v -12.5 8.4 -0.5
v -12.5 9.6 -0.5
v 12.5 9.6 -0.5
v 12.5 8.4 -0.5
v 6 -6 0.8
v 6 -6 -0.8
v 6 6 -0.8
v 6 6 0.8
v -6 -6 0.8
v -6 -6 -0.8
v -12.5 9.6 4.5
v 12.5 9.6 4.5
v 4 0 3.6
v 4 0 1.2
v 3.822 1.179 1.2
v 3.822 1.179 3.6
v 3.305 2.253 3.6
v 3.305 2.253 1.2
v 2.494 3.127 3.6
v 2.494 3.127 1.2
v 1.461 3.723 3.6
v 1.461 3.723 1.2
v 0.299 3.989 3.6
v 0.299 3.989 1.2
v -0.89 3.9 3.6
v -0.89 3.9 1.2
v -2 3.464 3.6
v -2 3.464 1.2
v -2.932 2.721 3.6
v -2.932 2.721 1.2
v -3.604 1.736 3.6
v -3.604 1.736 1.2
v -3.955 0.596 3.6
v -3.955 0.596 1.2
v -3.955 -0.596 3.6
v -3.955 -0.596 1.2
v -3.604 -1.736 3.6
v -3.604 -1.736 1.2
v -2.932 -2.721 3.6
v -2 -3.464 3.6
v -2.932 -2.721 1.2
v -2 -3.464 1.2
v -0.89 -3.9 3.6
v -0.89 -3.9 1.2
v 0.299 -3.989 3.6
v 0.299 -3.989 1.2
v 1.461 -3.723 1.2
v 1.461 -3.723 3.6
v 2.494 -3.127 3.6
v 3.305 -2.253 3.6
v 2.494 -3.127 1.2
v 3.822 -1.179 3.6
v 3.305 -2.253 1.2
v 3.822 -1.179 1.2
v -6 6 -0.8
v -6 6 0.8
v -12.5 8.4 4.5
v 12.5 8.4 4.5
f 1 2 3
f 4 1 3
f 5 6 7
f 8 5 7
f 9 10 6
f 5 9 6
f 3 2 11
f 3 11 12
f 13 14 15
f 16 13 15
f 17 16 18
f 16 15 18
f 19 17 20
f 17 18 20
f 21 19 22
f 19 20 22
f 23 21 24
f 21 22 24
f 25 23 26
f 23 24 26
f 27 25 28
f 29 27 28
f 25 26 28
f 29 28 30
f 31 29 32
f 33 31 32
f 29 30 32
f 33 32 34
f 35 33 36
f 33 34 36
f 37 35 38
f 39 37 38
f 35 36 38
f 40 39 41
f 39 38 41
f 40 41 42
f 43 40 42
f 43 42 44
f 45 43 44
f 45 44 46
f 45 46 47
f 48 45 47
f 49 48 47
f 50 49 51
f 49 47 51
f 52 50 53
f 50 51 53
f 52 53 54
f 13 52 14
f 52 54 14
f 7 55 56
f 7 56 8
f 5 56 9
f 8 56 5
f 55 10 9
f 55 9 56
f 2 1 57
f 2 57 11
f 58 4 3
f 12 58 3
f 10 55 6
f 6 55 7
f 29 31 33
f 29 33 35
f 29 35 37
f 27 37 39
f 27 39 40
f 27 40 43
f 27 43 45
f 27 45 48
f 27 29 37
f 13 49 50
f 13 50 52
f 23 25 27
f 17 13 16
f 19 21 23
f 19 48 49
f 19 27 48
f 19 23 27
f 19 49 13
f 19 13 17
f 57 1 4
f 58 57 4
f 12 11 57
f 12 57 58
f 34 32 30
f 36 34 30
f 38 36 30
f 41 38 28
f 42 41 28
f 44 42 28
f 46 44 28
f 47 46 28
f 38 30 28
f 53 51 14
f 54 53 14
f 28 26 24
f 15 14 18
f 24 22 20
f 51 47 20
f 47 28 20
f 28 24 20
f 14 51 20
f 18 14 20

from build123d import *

# Parameters (mm, degrees)
WS2812_START                          = -0.8
SKETCH_1_W                            = 12
SKETCH_1_H                            = 12
WS2812_RGB_LED_BOARD_12_X_12_MM_DEPTH = 1.6
RGB_START                             = 1.2
SKETCH_2_R                            = 4
RGB_LED_DIFFUSER_DEPTH                = 2.4
LED_START                             = -0.5
SKETCH_3_W                            = 25
SKETCH_3_H                            = 1.2
LED_LABEL_PLATE_WS2812_DEPTH          = 5


with BuildPart() as part:
    # 草图1 → WS2812 RGB LED board - 12 x 12 mm (new body)
    with BuildSketch(Plane.XY.offset(WS2812_START)):
        Rectangle(SKETCH_1_W, SKETCH_1_H)
    extrude(amount=WS2812_RGB_LED_BOARD_12_X_12_MM_DEPTH)


with BuildPart() as body_2:
    # 草图2 → RGB LED diffuser (new body)
    with BuildSketch(Plane.XY.offset(RGB_START)):
        Circle(SKETCH_2_R)
    extrude(amount=RGB_LED_DIFFUSER_DEPTH)


with BuildPart() as body_3:
    # 草图3 → led label plate - WS2812 (new body)
    with BuildSketch(Plane.XY.offset(LED_START)):
        with Locations((0, 9)):
            Rectangle(SKETCH_3_W, SKETCH_3_H)
    extrude(amount=LED_LABEL_PLATE_WS2812_DEPTH)


solid = Compound([part.part, body_2.part, body_3.part])
